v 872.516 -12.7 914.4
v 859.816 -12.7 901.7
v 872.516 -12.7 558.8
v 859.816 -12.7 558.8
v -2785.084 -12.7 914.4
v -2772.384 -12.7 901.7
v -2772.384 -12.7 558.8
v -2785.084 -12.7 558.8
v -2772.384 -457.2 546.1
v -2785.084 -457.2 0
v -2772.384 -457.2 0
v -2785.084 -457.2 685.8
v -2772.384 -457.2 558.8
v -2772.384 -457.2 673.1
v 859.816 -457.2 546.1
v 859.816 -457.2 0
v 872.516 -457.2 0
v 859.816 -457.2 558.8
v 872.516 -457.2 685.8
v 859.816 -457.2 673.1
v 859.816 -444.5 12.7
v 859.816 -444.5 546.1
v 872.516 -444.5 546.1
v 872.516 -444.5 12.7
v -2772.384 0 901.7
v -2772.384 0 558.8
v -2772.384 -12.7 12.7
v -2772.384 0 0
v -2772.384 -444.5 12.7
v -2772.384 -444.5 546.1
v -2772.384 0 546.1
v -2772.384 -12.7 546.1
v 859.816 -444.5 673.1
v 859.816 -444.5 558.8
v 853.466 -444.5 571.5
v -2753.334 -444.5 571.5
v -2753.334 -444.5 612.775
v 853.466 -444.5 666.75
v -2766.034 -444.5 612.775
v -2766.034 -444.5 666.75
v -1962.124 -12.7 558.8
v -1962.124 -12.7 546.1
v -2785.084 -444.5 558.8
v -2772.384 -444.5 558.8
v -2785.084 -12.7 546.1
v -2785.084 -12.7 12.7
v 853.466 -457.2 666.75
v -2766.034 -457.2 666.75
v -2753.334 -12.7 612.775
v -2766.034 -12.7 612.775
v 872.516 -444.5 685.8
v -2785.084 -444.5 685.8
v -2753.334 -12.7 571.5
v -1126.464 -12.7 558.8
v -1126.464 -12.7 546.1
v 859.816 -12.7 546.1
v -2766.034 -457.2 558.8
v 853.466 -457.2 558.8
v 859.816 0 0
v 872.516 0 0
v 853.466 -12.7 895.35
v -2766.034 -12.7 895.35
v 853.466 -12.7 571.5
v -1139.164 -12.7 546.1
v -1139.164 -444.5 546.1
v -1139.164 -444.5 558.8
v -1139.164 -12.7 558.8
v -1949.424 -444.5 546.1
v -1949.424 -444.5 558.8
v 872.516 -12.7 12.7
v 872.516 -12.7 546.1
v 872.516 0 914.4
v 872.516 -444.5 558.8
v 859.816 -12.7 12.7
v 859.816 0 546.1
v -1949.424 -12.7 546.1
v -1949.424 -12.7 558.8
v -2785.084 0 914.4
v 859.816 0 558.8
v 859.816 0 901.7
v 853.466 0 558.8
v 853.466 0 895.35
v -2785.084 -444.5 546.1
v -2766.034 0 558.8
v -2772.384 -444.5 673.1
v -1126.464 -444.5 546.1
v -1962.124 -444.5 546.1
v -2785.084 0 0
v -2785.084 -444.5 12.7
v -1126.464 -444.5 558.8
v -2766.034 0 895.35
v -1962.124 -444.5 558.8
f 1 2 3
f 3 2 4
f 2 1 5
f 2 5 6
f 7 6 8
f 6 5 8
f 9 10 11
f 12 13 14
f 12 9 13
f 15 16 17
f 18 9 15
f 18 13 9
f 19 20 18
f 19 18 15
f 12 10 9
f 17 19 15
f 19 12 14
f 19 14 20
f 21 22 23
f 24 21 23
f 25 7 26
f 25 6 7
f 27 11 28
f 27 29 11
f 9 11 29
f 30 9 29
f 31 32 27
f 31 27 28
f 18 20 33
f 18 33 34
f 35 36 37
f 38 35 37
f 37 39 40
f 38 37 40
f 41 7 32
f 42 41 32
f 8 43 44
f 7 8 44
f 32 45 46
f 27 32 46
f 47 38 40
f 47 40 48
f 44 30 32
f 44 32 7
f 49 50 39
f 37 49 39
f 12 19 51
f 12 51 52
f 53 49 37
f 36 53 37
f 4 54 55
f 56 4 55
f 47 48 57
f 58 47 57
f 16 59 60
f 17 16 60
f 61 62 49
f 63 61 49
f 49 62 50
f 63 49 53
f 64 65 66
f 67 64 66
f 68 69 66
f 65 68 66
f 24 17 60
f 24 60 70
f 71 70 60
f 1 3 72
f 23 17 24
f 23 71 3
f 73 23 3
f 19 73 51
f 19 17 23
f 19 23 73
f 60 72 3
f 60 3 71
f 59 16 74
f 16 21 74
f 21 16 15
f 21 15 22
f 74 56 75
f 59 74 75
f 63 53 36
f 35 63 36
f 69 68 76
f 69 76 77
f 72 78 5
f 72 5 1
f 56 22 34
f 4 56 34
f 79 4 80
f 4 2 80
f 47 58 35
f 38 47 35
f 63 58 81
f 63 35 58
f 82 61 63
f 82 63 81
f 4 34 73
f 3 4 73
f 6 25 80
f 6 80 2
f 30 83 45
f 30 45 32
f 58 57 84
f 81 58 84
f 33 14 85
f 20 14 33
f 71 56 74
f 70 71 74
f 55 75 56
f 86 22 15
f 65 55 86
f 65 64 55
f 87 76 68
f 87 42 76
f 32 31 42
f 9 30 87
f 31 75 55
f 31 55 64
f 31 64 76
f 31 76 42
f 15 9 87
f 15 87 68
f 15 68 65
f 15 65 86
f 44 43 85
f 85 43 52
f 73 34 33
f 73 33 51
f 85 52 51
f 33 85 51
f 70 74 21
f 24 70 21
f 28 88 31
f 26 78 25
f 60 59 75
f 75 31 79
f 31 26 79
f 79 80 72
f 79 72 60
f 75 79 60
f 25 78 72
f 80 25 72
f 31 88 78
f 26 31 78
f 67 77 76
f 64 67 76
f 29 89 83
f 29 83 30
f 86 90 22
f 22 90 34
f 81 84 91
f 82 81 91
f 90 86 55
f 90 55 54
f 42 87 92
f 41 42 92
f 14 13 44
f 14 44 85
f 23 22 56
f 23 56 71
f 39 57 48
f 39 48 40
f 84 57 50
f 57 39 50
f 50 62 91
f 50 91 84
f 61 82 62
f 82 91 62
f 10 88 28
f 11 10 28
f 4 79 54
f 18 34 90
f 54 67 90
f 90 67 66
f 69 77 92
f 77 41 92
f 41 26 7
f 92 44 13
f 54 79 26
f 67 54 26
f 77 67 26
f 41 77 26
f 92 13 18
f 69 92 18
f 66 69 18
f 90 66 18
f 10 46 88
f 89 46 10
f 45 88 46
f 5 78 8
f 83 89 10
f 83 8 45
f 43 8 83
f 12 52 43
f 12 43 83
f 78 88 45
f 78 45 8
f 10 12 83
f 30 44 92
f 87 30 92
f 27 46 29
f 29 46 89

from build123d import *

# Parameters (mm, degrees)
F0_W      = 3657.6
F0_H      = 914.4
F1_DEPTH  = 457.2
F3_DEPTH  = 3657.6
F7_DEPTH  = 1816.1
F8_DEPTH  = 1816.1
F10_DEPTH = 12.7
F11_W     = 12.7
F11_H     = 12.7
F12_DEPTH = 3644.9
F13_W     = 12.7
F13_H     = 12.7
F14_DEPTH = 444.5
F16_DEPTH = 1809.75
F17_DEPTH = 1809.75
F18_W     = 457.2
F18_H     = 53.975
F19_DEPTH = 12.7


with BuildPart() as f1:
    # F0 (on Front) → F1 (new body)
    with BuildSketch(Plane.XZ):
        with Locations((-956.2838003924, 457.2)):
            Rectangle(F0_W, F0_H)
    extrude(amount=F1_DEPTH)

    # F2 (on face) → F3 (cut, through all)
    with BuildSketch(Plane(origin=(-2785.0838003924, 0, 0), x_dir=(0, -1, 0), z_dir=(-1, 0, 0))):
        Polygon((457.2, 558.8), (457.2, 914.4), (12.7, 914.4), (12.7, 12.7), (444.5, 12.7), (444.5, 558.8), align=None)
    extrude(amount=-F3_DEPTH, mode=Mode.SUBTRACT)

    # F6 (on plane+point) → F7 (cut, through all)
    with BuildSketch(Plane.YZ.offset(-956.2838003924)):
        Polygon((178.1790405512, -48.0869802773), (178.1790405512, 901.7), (-187.0097050519, 901.7), (-187.0097050519, 546.1), (-558.2818984985, 546.1), (-558.2818984985, -48.0869802773), align=None)
    extrude(amount=-F7_DEPTH, mode=Mode.SUBTRACT)

    # F6 (on plane+point) → F8 (cut, through all)
    with BuildSketch(Plane.YZ.offset(-956.2838003924)):
        Polygon((178.1790405512, -48.0869802773), (178.1790405512, 901.7), (-187.0097050519, 901.7), (-187.0097050519, 546.1), (-558.2818984985, 546.1), (-558.2818984985, -48.0869802773), align=None)
    extrude(amount=F8_DEPTH, mode=Mode.SUBTRACT)

    # F9 (on face) → F10 (join, through all)
    with BuildSketch(Plane.XZ.offset(457.2)):
        Polygon((-2785.0838003924, 685.8), (-2785.0838003924, 558.8), (-2772.3838003924, 558.8), (-2772.3838003924, 673.1), (859.8161996076, 673.1), (859.8161996076, 558.8), (872.5161996076, 558.8), (872.5161996076, 685.8), align=None)
    extrude(amount=-F10_DEPTH)

    # F11 (on face) → F12 (join, through all)
    with BuildSketch(Plane(origin=(-2785.0838003924, 0, 0), x_dir=(0, -1, 0), z_dir=(-1, 0, 0))):
        with Locations((6.35, 552.45)):
            Rectangle(F11_W, F11_H)
    extrude(amount=-F12_DEPTH)

    # F13 (on face) → F14 (join, through all)
    with BuildSketch(Plane.XZ.offset(457.2)):
        with Locations((-2778.7338003924, 552.45)):
            Rectangle(F13_W, F13_H)
        with Locations((866.1661996076, 552.45)):
            Rectangle(F13_W, F13_H)
        with Locations((-1955.7738003924, 552.45)):
            Rectangle(F13_W, F13_H)
        with Locations((-1132.8138003924, 552.45)):
            Rectangle(F13_W, F13_H)
    extrude(amount=-F14_DEPTH)


with BuildPart() as f16:
    # F15 (on plane+point) → F16 (new body, through all)
    with BuildSketch(Plane.YZ.offset(-956.2838003924)):
        Polygon((0, 558.8), (0, 895.35), (-12.7, 895.35), (-12.7, 571.5), (-444.5, 571.5), (-444.5, 666.75), (-457.2, 666.75), (-457.2, 558.8), align=None)
    extrude(amount=-F16_DEPTH)

    # F15 (on plane+point) → F17 (join, through all)
    with BuildSketch(Plane.YZ.offset(-956.2838003924)):
        Polygon((0, 558.8), (0, 895.35), (-12.7, 895.35), (-12.7, 571.5), (-444.5, 571.5), (-444.5, 666.75), (-457.2, 666.75), (-457.2, 558.8), align=None)
    extrude(amount=F17_DEPTH)

    # F18 (on face) → F19 (join)
    with BuildSketch(Plane(origin=(-2766.0338003924, 0, 0), x_dir=(0, -1, 0), z_dir=(-1, 0, 0))):
        with Locations((228.6, 585.7875)):
            Rectangle(F18_W, F18_H)
    extrude(amount=-F19_DEPTH)


solid = Compound([f1.part, f16.part])
